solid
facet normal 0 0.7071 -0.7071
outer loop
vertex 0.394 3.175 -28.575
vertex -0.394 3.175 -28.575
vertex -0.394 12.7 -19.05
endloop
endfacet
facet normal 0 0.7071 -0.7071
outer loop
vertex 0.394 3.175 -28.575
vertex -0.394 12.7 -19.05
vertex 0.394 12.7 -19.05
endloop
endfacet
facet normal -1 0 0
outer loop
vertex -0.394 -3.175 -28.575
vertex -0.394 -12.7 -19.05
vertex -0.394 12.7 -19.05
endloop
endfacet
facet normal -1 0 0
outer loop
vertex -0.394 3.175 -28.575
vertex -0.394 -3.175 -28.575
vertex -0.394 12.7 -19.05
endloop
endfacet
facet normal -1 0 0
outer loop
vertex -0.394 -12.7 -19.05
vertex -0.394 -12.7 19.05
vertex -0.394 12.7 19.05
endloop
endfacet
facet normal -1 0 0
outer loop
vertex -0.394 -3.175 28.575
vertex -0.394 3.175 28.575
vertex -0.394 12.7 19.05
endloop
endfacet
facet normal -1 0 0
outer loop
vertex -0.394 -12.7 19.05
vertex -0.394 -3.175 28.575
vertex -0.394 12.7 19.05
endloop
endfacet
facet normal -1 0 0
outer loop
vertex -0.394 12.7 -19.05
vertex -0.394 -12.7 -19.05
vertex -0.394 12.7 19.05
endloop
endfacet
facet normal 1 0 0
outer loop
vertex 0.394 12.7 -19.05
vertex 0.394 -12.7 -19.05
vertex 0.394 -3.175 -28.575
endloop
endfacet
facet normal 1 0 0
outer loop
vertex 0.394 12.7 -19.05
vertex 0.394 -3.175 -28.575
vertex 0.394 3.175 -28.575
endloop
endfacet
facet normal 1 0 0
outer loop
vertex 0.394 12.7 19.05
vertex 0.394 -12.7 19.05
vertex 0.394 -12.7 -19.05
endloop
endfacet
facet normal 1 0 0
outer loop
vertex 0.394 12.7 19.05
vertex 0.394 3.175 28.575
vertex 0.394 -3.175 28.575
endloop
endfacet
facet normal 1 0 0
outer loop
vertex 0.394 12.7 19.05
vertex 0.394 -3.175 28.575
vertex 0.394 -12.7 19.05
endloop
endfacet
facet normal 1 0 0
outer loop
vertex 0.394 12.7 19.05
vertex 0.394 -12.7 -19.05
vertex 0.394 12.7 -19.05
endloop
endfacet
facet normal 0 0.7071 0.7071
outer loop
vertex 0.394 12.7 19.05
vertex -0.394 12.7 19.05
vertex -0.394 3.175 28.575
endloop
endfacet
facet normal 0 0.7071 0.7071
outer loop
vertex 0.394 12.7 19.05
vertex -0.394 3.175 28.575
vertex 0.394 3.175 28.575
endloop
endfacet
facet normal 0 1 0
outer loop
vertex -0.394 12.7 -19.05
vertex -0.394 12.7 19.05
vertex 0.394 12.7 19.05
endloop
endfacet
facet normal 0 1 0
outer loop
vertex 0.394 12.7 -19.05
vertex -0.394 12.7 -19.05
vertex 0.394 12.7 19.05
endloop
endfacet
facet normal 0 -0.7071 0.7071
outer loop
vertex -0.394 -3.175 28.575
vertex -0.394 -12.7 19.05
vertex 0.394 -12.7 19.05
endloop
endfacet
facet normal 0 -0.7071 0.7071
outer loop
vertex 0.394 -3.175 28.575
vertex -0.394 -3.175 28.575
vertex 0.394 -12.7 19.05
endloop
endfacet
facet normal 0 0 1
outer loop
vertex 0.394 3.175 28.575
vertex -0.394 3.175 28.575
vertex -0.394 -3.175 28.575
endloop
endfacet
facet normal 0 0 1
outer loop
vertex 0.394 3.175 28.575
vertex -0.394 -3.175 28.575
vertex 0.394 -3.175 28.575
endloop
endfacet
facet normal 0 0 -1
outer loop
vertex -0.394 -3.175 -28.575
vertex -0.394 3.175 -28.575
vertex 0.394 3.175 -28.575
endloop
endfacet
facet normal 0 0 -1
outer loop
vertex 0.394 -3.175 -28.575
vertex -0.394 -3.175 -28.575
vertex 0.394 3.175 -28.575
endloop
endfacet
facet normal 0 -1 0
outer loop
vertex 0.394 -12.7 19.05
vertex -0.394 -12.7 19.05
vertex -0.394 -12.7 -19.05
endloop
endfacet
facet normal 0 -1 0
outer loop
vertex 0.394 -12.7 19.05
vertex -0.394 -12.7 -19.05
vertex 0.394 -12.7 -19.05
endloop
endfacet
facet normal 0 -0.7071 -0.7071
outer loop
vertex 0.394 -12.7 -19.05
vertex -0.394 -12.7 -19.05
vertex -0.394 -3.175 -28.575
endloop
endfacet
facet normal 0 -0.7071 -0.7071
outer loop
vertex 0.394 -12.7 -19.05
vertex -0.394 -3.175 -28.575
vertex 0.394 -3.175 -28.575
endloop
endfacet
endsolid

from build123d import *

# Parameters (mm, degrees)
SKETCH1_W              = 0.7874
SKETCH1_H              = 25.4
MCMASTER_2636T21_DEPTH = 28.575
CHAMFER1_SIZE          = 9.525


with BuildPart() as part:
    # Sketch1 → McMaster 2636T21 (new body, symmetric)
    with BuildSketch(Plane.XY):
        Rectangle(SKETCH1_W, SKETCH1_H)
    extrude(amount=MCMASTER_2636T21_DEPTH, both=True)

    # Chamfer1
    chamfer1_edges = [part.edges().sort_by_distance(p)[0] for p in [
        (0, -12.7, 28.575),
        (0, -12.7, -28.575),
        (0, 12.7, -28.575),
        (0, 12.7, 28.575),
    ]]
    chamfer(chamfer1_edges, length=CHAMFER1_SIZE)


solid = part.part
